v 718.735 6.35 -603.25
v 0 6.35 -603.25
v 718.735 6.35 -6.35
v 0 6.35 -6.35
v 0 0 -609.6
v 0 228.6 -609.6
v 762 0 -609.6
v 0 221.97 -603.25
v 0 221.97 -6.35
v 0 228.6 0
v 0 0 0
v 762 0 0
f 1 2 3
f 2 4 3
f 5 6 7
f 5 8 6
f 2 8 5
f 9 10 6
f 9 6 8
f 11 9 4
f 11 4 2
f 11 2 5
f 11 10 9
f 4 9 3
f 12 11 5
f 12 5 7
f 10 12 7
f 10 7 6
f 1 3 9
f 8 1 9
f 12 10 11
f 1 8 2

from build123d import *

# Parameters (mm, degrees)
BOSS_EXTRUDE1_DEPTH = 609.6
SHELL1_T            = -6.35


with BuildPart() as part:
    # Sketch1 → Boss-Extrude1 (new body)
    with BuildSketch(Plane.XY):
        Polygon((0, 228.6), (0, 0), (762, 0), align=None)
    extrude(amount=-BOSS_EXTRUDE1_DEPTH)

    # Shell1
    shell1_openings = [part.faces().sort_by_distance(p)[0] for p in [
        (0, 114.3, -304.8),
    ]]
    offset(amount=SHELL1_T, openings=shell1_openings, kind=Kind.INTERSECTION)


solid = part.part
